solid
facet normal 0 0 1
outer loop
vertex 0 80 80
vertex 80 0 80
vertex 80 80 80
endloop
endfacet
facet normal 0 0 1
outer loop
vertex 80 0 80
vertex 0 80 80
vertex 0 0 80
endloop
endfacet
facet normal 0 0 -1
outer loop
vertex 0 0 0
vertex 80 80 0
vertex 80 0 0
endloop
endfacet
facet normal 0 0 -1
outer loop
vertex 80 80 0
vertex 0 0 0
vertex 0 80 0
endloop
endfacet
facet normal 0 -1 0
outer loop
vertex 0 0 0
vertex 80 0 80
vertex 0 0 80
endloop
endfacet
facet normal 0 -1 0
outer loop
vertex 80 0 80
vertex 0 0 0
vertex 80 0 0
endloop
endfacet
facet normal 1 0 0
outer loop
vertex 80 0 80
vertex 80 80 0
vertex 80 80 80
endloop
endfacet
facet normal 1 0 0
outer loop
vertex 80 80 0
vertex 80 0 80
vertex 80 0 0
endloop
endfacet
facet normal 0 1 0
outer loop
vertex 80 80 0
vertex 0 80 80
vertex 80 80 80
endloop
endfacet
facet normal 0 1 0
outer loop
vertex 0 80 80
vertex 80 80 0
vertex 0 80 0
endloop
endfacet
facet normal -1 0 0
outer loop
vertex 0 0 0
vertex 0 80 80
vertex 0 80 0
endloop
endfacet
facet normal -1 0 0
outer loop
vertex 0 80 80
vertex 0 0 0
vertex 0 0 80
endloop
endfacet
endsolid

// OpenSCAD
// file: tetrahedron.scad
module create_tetrahedra(tetrahedron_count, tetrahedron_indices) {
    for (i = [0:tetrahedron_count-1]) {
        vertex_indices = tetrahedron_indices[i];

        tetrahedron_vertices = [
            edges_and_corners[vertex_indices[0]],
            edges_and_corners[vertex_indices[1]],
            edges_and_corners[vertex_indices[2]],
            edges_and_corners[vertex_indices[3]]
        ];

        tetrahedron(tetrahedron_vertices, tetrahedron_colors[i]);
    }
}

module tetrahedron(tetrahedron_vertices, tetrahedron_color) {
    color(tetrahedron_color) polyhedron(points=tetrahedron_vertices, faces=[[0, 1, 2], [0, 2, 3], [0, 3, 1], [1, 2, 3]]);
}
// file: cube.scad
size = 80;
alpha = 0.5;

   edges = [
        [size/2, 0, 0],
        [size, size/2, 0],
        [size/2, size, 0],
        [0, size/2, 0],
        [size/2, 0, size],
        [size, size/2, size],
        [size/2, size, size],
        [0, size/2, size],
        [0, 0, size/2],
        [size, 0, size/2],
        [size, size, size/2],
        [0, size, size/2],
    ];

    corners = [
        [0, 0, 0],
        [size, 0, 0],
        [size, size, 0],
        [0, size, 0],
        [0, 0, size],
        [size, 0, size],
        [size, size, size],
        [0, size, size],
    ];

    edges_and_corners = concat(edges, corners);

module labeled_cube() {
  translate([0, 0, 0]) {
    color([1, 1, 1, 0.5]) cube(size, center=false); // create a transparent cube with the given size, centered at the given corner coordinates

    // label the corner points
    // We are adjusting the labels by custom offsets and rotations.
    translate(corners[0]+[0, 0, -5]) rotate([90, 0, 0]) text("C12", size=5);
    translate(corners[1]+[0, 0, -5]) rotate([90, 0, 0]) text("C13", size=5);
    translate(corners[2]+[0, 0, -5]) rotate([90, 0, 0]) text("C14", size=5);
    translate(corners[3]+[0, 0, -5]) rotate([90, 0, 0]) text("C15", size=5);
    translate(corners[4]) rotate([90, 0, 0]) text("C16", size=5);
    translate(corners[5]) rotate([90, 0, 0]) text("C17", size=5);
    translate(corners[6]) rotate([90, 0, 0]) text("C18", size=5);
    translate(corners[7]) rotate([90, 0, 0]) text("C19", size=5);

    // label the edges
    // We are adjusting the labels by custom offsets and rotations.
    translate(edges[0]+[0, 0, -5]) rotate([90, 0, 0]) text("E0", size=5);
    translate(edges[1]+[0, -3, -5]) rotate([90, 0, 90]) text("E1", size=5);
    translate(edges[2]+[5, 0, -5]) rotate([90, 0, 180]) text("E2", size=5);
    translate(edges[3]+[0, 0, -5]) rotate([90, 0, -90]) text("E3", size=5);
    translate(edges[4]+[0, 0, 2]) rotate([90, 0, 0]) text("E4", size=5);
    translate(edges[5]+[0, -3, 2]) rotate([90, 0, 90]) text("E5", size=5);
    translate(edges[6]+[5, 0, 2]) rotate([90, 0, 180]) text("E6", size=5);
    translate(edges[7]+[0, 3, 2]) rotate([90, 0, -90]) text("E7", size=5);
    translate(edges[8]+[-1, 0, 0]) rotate([0, -90, 90]) text("E8", size=5);
    translate(edges[9]+[5, 0, 0]) rotate([90, -90, 0]) text("E9", size=5);
    translate(edges[10]+[1, 0, 0]) rotate([180, -90, 90]) text("E10", size=5);
    translate(edges[11]+[-1, 0, 0]) rotate([0, -90, 0]) text("E11", size=5);
  }
}
// main file
// Only the first corner of the cube has zero/negative value.

include <cube.scad>;
include <tetrahedron.scad>

tetrahedron_count = 6;

tetrahedron_indices = [
        [12+0, 12+4, 12+7, 12+6],
        [12+0, 12+3, 12+7, 12+6],
        [12+0, 12+4, 12+5, 12+6],
        [12+0, 12+1, 12+5, 12+6],
        [12+0, 12+3, 12+2, 12+6],
        [12+0, 12+1, 12+2, 12+6],
    ];

tetrahedron_colors = [
    [1, 0, 0, alpha],  // red
    [0, 1, 0, alpha],  // green
    [0, 0, 1, alpha],  // blue
    [1, 1, 0, alpha],  // yellow
    [1, 0, 1, alpha],  // magenta
    [0, 1, 1, alpha]   // cyan
];

create_tetrahedra(tetrahedron_count = tetrahedron_count, tetrahedron_indices = tetrahedron_indices);

// Just to be able to visualize the created tetrahedra with respect to the cube.
labeled_cube();
